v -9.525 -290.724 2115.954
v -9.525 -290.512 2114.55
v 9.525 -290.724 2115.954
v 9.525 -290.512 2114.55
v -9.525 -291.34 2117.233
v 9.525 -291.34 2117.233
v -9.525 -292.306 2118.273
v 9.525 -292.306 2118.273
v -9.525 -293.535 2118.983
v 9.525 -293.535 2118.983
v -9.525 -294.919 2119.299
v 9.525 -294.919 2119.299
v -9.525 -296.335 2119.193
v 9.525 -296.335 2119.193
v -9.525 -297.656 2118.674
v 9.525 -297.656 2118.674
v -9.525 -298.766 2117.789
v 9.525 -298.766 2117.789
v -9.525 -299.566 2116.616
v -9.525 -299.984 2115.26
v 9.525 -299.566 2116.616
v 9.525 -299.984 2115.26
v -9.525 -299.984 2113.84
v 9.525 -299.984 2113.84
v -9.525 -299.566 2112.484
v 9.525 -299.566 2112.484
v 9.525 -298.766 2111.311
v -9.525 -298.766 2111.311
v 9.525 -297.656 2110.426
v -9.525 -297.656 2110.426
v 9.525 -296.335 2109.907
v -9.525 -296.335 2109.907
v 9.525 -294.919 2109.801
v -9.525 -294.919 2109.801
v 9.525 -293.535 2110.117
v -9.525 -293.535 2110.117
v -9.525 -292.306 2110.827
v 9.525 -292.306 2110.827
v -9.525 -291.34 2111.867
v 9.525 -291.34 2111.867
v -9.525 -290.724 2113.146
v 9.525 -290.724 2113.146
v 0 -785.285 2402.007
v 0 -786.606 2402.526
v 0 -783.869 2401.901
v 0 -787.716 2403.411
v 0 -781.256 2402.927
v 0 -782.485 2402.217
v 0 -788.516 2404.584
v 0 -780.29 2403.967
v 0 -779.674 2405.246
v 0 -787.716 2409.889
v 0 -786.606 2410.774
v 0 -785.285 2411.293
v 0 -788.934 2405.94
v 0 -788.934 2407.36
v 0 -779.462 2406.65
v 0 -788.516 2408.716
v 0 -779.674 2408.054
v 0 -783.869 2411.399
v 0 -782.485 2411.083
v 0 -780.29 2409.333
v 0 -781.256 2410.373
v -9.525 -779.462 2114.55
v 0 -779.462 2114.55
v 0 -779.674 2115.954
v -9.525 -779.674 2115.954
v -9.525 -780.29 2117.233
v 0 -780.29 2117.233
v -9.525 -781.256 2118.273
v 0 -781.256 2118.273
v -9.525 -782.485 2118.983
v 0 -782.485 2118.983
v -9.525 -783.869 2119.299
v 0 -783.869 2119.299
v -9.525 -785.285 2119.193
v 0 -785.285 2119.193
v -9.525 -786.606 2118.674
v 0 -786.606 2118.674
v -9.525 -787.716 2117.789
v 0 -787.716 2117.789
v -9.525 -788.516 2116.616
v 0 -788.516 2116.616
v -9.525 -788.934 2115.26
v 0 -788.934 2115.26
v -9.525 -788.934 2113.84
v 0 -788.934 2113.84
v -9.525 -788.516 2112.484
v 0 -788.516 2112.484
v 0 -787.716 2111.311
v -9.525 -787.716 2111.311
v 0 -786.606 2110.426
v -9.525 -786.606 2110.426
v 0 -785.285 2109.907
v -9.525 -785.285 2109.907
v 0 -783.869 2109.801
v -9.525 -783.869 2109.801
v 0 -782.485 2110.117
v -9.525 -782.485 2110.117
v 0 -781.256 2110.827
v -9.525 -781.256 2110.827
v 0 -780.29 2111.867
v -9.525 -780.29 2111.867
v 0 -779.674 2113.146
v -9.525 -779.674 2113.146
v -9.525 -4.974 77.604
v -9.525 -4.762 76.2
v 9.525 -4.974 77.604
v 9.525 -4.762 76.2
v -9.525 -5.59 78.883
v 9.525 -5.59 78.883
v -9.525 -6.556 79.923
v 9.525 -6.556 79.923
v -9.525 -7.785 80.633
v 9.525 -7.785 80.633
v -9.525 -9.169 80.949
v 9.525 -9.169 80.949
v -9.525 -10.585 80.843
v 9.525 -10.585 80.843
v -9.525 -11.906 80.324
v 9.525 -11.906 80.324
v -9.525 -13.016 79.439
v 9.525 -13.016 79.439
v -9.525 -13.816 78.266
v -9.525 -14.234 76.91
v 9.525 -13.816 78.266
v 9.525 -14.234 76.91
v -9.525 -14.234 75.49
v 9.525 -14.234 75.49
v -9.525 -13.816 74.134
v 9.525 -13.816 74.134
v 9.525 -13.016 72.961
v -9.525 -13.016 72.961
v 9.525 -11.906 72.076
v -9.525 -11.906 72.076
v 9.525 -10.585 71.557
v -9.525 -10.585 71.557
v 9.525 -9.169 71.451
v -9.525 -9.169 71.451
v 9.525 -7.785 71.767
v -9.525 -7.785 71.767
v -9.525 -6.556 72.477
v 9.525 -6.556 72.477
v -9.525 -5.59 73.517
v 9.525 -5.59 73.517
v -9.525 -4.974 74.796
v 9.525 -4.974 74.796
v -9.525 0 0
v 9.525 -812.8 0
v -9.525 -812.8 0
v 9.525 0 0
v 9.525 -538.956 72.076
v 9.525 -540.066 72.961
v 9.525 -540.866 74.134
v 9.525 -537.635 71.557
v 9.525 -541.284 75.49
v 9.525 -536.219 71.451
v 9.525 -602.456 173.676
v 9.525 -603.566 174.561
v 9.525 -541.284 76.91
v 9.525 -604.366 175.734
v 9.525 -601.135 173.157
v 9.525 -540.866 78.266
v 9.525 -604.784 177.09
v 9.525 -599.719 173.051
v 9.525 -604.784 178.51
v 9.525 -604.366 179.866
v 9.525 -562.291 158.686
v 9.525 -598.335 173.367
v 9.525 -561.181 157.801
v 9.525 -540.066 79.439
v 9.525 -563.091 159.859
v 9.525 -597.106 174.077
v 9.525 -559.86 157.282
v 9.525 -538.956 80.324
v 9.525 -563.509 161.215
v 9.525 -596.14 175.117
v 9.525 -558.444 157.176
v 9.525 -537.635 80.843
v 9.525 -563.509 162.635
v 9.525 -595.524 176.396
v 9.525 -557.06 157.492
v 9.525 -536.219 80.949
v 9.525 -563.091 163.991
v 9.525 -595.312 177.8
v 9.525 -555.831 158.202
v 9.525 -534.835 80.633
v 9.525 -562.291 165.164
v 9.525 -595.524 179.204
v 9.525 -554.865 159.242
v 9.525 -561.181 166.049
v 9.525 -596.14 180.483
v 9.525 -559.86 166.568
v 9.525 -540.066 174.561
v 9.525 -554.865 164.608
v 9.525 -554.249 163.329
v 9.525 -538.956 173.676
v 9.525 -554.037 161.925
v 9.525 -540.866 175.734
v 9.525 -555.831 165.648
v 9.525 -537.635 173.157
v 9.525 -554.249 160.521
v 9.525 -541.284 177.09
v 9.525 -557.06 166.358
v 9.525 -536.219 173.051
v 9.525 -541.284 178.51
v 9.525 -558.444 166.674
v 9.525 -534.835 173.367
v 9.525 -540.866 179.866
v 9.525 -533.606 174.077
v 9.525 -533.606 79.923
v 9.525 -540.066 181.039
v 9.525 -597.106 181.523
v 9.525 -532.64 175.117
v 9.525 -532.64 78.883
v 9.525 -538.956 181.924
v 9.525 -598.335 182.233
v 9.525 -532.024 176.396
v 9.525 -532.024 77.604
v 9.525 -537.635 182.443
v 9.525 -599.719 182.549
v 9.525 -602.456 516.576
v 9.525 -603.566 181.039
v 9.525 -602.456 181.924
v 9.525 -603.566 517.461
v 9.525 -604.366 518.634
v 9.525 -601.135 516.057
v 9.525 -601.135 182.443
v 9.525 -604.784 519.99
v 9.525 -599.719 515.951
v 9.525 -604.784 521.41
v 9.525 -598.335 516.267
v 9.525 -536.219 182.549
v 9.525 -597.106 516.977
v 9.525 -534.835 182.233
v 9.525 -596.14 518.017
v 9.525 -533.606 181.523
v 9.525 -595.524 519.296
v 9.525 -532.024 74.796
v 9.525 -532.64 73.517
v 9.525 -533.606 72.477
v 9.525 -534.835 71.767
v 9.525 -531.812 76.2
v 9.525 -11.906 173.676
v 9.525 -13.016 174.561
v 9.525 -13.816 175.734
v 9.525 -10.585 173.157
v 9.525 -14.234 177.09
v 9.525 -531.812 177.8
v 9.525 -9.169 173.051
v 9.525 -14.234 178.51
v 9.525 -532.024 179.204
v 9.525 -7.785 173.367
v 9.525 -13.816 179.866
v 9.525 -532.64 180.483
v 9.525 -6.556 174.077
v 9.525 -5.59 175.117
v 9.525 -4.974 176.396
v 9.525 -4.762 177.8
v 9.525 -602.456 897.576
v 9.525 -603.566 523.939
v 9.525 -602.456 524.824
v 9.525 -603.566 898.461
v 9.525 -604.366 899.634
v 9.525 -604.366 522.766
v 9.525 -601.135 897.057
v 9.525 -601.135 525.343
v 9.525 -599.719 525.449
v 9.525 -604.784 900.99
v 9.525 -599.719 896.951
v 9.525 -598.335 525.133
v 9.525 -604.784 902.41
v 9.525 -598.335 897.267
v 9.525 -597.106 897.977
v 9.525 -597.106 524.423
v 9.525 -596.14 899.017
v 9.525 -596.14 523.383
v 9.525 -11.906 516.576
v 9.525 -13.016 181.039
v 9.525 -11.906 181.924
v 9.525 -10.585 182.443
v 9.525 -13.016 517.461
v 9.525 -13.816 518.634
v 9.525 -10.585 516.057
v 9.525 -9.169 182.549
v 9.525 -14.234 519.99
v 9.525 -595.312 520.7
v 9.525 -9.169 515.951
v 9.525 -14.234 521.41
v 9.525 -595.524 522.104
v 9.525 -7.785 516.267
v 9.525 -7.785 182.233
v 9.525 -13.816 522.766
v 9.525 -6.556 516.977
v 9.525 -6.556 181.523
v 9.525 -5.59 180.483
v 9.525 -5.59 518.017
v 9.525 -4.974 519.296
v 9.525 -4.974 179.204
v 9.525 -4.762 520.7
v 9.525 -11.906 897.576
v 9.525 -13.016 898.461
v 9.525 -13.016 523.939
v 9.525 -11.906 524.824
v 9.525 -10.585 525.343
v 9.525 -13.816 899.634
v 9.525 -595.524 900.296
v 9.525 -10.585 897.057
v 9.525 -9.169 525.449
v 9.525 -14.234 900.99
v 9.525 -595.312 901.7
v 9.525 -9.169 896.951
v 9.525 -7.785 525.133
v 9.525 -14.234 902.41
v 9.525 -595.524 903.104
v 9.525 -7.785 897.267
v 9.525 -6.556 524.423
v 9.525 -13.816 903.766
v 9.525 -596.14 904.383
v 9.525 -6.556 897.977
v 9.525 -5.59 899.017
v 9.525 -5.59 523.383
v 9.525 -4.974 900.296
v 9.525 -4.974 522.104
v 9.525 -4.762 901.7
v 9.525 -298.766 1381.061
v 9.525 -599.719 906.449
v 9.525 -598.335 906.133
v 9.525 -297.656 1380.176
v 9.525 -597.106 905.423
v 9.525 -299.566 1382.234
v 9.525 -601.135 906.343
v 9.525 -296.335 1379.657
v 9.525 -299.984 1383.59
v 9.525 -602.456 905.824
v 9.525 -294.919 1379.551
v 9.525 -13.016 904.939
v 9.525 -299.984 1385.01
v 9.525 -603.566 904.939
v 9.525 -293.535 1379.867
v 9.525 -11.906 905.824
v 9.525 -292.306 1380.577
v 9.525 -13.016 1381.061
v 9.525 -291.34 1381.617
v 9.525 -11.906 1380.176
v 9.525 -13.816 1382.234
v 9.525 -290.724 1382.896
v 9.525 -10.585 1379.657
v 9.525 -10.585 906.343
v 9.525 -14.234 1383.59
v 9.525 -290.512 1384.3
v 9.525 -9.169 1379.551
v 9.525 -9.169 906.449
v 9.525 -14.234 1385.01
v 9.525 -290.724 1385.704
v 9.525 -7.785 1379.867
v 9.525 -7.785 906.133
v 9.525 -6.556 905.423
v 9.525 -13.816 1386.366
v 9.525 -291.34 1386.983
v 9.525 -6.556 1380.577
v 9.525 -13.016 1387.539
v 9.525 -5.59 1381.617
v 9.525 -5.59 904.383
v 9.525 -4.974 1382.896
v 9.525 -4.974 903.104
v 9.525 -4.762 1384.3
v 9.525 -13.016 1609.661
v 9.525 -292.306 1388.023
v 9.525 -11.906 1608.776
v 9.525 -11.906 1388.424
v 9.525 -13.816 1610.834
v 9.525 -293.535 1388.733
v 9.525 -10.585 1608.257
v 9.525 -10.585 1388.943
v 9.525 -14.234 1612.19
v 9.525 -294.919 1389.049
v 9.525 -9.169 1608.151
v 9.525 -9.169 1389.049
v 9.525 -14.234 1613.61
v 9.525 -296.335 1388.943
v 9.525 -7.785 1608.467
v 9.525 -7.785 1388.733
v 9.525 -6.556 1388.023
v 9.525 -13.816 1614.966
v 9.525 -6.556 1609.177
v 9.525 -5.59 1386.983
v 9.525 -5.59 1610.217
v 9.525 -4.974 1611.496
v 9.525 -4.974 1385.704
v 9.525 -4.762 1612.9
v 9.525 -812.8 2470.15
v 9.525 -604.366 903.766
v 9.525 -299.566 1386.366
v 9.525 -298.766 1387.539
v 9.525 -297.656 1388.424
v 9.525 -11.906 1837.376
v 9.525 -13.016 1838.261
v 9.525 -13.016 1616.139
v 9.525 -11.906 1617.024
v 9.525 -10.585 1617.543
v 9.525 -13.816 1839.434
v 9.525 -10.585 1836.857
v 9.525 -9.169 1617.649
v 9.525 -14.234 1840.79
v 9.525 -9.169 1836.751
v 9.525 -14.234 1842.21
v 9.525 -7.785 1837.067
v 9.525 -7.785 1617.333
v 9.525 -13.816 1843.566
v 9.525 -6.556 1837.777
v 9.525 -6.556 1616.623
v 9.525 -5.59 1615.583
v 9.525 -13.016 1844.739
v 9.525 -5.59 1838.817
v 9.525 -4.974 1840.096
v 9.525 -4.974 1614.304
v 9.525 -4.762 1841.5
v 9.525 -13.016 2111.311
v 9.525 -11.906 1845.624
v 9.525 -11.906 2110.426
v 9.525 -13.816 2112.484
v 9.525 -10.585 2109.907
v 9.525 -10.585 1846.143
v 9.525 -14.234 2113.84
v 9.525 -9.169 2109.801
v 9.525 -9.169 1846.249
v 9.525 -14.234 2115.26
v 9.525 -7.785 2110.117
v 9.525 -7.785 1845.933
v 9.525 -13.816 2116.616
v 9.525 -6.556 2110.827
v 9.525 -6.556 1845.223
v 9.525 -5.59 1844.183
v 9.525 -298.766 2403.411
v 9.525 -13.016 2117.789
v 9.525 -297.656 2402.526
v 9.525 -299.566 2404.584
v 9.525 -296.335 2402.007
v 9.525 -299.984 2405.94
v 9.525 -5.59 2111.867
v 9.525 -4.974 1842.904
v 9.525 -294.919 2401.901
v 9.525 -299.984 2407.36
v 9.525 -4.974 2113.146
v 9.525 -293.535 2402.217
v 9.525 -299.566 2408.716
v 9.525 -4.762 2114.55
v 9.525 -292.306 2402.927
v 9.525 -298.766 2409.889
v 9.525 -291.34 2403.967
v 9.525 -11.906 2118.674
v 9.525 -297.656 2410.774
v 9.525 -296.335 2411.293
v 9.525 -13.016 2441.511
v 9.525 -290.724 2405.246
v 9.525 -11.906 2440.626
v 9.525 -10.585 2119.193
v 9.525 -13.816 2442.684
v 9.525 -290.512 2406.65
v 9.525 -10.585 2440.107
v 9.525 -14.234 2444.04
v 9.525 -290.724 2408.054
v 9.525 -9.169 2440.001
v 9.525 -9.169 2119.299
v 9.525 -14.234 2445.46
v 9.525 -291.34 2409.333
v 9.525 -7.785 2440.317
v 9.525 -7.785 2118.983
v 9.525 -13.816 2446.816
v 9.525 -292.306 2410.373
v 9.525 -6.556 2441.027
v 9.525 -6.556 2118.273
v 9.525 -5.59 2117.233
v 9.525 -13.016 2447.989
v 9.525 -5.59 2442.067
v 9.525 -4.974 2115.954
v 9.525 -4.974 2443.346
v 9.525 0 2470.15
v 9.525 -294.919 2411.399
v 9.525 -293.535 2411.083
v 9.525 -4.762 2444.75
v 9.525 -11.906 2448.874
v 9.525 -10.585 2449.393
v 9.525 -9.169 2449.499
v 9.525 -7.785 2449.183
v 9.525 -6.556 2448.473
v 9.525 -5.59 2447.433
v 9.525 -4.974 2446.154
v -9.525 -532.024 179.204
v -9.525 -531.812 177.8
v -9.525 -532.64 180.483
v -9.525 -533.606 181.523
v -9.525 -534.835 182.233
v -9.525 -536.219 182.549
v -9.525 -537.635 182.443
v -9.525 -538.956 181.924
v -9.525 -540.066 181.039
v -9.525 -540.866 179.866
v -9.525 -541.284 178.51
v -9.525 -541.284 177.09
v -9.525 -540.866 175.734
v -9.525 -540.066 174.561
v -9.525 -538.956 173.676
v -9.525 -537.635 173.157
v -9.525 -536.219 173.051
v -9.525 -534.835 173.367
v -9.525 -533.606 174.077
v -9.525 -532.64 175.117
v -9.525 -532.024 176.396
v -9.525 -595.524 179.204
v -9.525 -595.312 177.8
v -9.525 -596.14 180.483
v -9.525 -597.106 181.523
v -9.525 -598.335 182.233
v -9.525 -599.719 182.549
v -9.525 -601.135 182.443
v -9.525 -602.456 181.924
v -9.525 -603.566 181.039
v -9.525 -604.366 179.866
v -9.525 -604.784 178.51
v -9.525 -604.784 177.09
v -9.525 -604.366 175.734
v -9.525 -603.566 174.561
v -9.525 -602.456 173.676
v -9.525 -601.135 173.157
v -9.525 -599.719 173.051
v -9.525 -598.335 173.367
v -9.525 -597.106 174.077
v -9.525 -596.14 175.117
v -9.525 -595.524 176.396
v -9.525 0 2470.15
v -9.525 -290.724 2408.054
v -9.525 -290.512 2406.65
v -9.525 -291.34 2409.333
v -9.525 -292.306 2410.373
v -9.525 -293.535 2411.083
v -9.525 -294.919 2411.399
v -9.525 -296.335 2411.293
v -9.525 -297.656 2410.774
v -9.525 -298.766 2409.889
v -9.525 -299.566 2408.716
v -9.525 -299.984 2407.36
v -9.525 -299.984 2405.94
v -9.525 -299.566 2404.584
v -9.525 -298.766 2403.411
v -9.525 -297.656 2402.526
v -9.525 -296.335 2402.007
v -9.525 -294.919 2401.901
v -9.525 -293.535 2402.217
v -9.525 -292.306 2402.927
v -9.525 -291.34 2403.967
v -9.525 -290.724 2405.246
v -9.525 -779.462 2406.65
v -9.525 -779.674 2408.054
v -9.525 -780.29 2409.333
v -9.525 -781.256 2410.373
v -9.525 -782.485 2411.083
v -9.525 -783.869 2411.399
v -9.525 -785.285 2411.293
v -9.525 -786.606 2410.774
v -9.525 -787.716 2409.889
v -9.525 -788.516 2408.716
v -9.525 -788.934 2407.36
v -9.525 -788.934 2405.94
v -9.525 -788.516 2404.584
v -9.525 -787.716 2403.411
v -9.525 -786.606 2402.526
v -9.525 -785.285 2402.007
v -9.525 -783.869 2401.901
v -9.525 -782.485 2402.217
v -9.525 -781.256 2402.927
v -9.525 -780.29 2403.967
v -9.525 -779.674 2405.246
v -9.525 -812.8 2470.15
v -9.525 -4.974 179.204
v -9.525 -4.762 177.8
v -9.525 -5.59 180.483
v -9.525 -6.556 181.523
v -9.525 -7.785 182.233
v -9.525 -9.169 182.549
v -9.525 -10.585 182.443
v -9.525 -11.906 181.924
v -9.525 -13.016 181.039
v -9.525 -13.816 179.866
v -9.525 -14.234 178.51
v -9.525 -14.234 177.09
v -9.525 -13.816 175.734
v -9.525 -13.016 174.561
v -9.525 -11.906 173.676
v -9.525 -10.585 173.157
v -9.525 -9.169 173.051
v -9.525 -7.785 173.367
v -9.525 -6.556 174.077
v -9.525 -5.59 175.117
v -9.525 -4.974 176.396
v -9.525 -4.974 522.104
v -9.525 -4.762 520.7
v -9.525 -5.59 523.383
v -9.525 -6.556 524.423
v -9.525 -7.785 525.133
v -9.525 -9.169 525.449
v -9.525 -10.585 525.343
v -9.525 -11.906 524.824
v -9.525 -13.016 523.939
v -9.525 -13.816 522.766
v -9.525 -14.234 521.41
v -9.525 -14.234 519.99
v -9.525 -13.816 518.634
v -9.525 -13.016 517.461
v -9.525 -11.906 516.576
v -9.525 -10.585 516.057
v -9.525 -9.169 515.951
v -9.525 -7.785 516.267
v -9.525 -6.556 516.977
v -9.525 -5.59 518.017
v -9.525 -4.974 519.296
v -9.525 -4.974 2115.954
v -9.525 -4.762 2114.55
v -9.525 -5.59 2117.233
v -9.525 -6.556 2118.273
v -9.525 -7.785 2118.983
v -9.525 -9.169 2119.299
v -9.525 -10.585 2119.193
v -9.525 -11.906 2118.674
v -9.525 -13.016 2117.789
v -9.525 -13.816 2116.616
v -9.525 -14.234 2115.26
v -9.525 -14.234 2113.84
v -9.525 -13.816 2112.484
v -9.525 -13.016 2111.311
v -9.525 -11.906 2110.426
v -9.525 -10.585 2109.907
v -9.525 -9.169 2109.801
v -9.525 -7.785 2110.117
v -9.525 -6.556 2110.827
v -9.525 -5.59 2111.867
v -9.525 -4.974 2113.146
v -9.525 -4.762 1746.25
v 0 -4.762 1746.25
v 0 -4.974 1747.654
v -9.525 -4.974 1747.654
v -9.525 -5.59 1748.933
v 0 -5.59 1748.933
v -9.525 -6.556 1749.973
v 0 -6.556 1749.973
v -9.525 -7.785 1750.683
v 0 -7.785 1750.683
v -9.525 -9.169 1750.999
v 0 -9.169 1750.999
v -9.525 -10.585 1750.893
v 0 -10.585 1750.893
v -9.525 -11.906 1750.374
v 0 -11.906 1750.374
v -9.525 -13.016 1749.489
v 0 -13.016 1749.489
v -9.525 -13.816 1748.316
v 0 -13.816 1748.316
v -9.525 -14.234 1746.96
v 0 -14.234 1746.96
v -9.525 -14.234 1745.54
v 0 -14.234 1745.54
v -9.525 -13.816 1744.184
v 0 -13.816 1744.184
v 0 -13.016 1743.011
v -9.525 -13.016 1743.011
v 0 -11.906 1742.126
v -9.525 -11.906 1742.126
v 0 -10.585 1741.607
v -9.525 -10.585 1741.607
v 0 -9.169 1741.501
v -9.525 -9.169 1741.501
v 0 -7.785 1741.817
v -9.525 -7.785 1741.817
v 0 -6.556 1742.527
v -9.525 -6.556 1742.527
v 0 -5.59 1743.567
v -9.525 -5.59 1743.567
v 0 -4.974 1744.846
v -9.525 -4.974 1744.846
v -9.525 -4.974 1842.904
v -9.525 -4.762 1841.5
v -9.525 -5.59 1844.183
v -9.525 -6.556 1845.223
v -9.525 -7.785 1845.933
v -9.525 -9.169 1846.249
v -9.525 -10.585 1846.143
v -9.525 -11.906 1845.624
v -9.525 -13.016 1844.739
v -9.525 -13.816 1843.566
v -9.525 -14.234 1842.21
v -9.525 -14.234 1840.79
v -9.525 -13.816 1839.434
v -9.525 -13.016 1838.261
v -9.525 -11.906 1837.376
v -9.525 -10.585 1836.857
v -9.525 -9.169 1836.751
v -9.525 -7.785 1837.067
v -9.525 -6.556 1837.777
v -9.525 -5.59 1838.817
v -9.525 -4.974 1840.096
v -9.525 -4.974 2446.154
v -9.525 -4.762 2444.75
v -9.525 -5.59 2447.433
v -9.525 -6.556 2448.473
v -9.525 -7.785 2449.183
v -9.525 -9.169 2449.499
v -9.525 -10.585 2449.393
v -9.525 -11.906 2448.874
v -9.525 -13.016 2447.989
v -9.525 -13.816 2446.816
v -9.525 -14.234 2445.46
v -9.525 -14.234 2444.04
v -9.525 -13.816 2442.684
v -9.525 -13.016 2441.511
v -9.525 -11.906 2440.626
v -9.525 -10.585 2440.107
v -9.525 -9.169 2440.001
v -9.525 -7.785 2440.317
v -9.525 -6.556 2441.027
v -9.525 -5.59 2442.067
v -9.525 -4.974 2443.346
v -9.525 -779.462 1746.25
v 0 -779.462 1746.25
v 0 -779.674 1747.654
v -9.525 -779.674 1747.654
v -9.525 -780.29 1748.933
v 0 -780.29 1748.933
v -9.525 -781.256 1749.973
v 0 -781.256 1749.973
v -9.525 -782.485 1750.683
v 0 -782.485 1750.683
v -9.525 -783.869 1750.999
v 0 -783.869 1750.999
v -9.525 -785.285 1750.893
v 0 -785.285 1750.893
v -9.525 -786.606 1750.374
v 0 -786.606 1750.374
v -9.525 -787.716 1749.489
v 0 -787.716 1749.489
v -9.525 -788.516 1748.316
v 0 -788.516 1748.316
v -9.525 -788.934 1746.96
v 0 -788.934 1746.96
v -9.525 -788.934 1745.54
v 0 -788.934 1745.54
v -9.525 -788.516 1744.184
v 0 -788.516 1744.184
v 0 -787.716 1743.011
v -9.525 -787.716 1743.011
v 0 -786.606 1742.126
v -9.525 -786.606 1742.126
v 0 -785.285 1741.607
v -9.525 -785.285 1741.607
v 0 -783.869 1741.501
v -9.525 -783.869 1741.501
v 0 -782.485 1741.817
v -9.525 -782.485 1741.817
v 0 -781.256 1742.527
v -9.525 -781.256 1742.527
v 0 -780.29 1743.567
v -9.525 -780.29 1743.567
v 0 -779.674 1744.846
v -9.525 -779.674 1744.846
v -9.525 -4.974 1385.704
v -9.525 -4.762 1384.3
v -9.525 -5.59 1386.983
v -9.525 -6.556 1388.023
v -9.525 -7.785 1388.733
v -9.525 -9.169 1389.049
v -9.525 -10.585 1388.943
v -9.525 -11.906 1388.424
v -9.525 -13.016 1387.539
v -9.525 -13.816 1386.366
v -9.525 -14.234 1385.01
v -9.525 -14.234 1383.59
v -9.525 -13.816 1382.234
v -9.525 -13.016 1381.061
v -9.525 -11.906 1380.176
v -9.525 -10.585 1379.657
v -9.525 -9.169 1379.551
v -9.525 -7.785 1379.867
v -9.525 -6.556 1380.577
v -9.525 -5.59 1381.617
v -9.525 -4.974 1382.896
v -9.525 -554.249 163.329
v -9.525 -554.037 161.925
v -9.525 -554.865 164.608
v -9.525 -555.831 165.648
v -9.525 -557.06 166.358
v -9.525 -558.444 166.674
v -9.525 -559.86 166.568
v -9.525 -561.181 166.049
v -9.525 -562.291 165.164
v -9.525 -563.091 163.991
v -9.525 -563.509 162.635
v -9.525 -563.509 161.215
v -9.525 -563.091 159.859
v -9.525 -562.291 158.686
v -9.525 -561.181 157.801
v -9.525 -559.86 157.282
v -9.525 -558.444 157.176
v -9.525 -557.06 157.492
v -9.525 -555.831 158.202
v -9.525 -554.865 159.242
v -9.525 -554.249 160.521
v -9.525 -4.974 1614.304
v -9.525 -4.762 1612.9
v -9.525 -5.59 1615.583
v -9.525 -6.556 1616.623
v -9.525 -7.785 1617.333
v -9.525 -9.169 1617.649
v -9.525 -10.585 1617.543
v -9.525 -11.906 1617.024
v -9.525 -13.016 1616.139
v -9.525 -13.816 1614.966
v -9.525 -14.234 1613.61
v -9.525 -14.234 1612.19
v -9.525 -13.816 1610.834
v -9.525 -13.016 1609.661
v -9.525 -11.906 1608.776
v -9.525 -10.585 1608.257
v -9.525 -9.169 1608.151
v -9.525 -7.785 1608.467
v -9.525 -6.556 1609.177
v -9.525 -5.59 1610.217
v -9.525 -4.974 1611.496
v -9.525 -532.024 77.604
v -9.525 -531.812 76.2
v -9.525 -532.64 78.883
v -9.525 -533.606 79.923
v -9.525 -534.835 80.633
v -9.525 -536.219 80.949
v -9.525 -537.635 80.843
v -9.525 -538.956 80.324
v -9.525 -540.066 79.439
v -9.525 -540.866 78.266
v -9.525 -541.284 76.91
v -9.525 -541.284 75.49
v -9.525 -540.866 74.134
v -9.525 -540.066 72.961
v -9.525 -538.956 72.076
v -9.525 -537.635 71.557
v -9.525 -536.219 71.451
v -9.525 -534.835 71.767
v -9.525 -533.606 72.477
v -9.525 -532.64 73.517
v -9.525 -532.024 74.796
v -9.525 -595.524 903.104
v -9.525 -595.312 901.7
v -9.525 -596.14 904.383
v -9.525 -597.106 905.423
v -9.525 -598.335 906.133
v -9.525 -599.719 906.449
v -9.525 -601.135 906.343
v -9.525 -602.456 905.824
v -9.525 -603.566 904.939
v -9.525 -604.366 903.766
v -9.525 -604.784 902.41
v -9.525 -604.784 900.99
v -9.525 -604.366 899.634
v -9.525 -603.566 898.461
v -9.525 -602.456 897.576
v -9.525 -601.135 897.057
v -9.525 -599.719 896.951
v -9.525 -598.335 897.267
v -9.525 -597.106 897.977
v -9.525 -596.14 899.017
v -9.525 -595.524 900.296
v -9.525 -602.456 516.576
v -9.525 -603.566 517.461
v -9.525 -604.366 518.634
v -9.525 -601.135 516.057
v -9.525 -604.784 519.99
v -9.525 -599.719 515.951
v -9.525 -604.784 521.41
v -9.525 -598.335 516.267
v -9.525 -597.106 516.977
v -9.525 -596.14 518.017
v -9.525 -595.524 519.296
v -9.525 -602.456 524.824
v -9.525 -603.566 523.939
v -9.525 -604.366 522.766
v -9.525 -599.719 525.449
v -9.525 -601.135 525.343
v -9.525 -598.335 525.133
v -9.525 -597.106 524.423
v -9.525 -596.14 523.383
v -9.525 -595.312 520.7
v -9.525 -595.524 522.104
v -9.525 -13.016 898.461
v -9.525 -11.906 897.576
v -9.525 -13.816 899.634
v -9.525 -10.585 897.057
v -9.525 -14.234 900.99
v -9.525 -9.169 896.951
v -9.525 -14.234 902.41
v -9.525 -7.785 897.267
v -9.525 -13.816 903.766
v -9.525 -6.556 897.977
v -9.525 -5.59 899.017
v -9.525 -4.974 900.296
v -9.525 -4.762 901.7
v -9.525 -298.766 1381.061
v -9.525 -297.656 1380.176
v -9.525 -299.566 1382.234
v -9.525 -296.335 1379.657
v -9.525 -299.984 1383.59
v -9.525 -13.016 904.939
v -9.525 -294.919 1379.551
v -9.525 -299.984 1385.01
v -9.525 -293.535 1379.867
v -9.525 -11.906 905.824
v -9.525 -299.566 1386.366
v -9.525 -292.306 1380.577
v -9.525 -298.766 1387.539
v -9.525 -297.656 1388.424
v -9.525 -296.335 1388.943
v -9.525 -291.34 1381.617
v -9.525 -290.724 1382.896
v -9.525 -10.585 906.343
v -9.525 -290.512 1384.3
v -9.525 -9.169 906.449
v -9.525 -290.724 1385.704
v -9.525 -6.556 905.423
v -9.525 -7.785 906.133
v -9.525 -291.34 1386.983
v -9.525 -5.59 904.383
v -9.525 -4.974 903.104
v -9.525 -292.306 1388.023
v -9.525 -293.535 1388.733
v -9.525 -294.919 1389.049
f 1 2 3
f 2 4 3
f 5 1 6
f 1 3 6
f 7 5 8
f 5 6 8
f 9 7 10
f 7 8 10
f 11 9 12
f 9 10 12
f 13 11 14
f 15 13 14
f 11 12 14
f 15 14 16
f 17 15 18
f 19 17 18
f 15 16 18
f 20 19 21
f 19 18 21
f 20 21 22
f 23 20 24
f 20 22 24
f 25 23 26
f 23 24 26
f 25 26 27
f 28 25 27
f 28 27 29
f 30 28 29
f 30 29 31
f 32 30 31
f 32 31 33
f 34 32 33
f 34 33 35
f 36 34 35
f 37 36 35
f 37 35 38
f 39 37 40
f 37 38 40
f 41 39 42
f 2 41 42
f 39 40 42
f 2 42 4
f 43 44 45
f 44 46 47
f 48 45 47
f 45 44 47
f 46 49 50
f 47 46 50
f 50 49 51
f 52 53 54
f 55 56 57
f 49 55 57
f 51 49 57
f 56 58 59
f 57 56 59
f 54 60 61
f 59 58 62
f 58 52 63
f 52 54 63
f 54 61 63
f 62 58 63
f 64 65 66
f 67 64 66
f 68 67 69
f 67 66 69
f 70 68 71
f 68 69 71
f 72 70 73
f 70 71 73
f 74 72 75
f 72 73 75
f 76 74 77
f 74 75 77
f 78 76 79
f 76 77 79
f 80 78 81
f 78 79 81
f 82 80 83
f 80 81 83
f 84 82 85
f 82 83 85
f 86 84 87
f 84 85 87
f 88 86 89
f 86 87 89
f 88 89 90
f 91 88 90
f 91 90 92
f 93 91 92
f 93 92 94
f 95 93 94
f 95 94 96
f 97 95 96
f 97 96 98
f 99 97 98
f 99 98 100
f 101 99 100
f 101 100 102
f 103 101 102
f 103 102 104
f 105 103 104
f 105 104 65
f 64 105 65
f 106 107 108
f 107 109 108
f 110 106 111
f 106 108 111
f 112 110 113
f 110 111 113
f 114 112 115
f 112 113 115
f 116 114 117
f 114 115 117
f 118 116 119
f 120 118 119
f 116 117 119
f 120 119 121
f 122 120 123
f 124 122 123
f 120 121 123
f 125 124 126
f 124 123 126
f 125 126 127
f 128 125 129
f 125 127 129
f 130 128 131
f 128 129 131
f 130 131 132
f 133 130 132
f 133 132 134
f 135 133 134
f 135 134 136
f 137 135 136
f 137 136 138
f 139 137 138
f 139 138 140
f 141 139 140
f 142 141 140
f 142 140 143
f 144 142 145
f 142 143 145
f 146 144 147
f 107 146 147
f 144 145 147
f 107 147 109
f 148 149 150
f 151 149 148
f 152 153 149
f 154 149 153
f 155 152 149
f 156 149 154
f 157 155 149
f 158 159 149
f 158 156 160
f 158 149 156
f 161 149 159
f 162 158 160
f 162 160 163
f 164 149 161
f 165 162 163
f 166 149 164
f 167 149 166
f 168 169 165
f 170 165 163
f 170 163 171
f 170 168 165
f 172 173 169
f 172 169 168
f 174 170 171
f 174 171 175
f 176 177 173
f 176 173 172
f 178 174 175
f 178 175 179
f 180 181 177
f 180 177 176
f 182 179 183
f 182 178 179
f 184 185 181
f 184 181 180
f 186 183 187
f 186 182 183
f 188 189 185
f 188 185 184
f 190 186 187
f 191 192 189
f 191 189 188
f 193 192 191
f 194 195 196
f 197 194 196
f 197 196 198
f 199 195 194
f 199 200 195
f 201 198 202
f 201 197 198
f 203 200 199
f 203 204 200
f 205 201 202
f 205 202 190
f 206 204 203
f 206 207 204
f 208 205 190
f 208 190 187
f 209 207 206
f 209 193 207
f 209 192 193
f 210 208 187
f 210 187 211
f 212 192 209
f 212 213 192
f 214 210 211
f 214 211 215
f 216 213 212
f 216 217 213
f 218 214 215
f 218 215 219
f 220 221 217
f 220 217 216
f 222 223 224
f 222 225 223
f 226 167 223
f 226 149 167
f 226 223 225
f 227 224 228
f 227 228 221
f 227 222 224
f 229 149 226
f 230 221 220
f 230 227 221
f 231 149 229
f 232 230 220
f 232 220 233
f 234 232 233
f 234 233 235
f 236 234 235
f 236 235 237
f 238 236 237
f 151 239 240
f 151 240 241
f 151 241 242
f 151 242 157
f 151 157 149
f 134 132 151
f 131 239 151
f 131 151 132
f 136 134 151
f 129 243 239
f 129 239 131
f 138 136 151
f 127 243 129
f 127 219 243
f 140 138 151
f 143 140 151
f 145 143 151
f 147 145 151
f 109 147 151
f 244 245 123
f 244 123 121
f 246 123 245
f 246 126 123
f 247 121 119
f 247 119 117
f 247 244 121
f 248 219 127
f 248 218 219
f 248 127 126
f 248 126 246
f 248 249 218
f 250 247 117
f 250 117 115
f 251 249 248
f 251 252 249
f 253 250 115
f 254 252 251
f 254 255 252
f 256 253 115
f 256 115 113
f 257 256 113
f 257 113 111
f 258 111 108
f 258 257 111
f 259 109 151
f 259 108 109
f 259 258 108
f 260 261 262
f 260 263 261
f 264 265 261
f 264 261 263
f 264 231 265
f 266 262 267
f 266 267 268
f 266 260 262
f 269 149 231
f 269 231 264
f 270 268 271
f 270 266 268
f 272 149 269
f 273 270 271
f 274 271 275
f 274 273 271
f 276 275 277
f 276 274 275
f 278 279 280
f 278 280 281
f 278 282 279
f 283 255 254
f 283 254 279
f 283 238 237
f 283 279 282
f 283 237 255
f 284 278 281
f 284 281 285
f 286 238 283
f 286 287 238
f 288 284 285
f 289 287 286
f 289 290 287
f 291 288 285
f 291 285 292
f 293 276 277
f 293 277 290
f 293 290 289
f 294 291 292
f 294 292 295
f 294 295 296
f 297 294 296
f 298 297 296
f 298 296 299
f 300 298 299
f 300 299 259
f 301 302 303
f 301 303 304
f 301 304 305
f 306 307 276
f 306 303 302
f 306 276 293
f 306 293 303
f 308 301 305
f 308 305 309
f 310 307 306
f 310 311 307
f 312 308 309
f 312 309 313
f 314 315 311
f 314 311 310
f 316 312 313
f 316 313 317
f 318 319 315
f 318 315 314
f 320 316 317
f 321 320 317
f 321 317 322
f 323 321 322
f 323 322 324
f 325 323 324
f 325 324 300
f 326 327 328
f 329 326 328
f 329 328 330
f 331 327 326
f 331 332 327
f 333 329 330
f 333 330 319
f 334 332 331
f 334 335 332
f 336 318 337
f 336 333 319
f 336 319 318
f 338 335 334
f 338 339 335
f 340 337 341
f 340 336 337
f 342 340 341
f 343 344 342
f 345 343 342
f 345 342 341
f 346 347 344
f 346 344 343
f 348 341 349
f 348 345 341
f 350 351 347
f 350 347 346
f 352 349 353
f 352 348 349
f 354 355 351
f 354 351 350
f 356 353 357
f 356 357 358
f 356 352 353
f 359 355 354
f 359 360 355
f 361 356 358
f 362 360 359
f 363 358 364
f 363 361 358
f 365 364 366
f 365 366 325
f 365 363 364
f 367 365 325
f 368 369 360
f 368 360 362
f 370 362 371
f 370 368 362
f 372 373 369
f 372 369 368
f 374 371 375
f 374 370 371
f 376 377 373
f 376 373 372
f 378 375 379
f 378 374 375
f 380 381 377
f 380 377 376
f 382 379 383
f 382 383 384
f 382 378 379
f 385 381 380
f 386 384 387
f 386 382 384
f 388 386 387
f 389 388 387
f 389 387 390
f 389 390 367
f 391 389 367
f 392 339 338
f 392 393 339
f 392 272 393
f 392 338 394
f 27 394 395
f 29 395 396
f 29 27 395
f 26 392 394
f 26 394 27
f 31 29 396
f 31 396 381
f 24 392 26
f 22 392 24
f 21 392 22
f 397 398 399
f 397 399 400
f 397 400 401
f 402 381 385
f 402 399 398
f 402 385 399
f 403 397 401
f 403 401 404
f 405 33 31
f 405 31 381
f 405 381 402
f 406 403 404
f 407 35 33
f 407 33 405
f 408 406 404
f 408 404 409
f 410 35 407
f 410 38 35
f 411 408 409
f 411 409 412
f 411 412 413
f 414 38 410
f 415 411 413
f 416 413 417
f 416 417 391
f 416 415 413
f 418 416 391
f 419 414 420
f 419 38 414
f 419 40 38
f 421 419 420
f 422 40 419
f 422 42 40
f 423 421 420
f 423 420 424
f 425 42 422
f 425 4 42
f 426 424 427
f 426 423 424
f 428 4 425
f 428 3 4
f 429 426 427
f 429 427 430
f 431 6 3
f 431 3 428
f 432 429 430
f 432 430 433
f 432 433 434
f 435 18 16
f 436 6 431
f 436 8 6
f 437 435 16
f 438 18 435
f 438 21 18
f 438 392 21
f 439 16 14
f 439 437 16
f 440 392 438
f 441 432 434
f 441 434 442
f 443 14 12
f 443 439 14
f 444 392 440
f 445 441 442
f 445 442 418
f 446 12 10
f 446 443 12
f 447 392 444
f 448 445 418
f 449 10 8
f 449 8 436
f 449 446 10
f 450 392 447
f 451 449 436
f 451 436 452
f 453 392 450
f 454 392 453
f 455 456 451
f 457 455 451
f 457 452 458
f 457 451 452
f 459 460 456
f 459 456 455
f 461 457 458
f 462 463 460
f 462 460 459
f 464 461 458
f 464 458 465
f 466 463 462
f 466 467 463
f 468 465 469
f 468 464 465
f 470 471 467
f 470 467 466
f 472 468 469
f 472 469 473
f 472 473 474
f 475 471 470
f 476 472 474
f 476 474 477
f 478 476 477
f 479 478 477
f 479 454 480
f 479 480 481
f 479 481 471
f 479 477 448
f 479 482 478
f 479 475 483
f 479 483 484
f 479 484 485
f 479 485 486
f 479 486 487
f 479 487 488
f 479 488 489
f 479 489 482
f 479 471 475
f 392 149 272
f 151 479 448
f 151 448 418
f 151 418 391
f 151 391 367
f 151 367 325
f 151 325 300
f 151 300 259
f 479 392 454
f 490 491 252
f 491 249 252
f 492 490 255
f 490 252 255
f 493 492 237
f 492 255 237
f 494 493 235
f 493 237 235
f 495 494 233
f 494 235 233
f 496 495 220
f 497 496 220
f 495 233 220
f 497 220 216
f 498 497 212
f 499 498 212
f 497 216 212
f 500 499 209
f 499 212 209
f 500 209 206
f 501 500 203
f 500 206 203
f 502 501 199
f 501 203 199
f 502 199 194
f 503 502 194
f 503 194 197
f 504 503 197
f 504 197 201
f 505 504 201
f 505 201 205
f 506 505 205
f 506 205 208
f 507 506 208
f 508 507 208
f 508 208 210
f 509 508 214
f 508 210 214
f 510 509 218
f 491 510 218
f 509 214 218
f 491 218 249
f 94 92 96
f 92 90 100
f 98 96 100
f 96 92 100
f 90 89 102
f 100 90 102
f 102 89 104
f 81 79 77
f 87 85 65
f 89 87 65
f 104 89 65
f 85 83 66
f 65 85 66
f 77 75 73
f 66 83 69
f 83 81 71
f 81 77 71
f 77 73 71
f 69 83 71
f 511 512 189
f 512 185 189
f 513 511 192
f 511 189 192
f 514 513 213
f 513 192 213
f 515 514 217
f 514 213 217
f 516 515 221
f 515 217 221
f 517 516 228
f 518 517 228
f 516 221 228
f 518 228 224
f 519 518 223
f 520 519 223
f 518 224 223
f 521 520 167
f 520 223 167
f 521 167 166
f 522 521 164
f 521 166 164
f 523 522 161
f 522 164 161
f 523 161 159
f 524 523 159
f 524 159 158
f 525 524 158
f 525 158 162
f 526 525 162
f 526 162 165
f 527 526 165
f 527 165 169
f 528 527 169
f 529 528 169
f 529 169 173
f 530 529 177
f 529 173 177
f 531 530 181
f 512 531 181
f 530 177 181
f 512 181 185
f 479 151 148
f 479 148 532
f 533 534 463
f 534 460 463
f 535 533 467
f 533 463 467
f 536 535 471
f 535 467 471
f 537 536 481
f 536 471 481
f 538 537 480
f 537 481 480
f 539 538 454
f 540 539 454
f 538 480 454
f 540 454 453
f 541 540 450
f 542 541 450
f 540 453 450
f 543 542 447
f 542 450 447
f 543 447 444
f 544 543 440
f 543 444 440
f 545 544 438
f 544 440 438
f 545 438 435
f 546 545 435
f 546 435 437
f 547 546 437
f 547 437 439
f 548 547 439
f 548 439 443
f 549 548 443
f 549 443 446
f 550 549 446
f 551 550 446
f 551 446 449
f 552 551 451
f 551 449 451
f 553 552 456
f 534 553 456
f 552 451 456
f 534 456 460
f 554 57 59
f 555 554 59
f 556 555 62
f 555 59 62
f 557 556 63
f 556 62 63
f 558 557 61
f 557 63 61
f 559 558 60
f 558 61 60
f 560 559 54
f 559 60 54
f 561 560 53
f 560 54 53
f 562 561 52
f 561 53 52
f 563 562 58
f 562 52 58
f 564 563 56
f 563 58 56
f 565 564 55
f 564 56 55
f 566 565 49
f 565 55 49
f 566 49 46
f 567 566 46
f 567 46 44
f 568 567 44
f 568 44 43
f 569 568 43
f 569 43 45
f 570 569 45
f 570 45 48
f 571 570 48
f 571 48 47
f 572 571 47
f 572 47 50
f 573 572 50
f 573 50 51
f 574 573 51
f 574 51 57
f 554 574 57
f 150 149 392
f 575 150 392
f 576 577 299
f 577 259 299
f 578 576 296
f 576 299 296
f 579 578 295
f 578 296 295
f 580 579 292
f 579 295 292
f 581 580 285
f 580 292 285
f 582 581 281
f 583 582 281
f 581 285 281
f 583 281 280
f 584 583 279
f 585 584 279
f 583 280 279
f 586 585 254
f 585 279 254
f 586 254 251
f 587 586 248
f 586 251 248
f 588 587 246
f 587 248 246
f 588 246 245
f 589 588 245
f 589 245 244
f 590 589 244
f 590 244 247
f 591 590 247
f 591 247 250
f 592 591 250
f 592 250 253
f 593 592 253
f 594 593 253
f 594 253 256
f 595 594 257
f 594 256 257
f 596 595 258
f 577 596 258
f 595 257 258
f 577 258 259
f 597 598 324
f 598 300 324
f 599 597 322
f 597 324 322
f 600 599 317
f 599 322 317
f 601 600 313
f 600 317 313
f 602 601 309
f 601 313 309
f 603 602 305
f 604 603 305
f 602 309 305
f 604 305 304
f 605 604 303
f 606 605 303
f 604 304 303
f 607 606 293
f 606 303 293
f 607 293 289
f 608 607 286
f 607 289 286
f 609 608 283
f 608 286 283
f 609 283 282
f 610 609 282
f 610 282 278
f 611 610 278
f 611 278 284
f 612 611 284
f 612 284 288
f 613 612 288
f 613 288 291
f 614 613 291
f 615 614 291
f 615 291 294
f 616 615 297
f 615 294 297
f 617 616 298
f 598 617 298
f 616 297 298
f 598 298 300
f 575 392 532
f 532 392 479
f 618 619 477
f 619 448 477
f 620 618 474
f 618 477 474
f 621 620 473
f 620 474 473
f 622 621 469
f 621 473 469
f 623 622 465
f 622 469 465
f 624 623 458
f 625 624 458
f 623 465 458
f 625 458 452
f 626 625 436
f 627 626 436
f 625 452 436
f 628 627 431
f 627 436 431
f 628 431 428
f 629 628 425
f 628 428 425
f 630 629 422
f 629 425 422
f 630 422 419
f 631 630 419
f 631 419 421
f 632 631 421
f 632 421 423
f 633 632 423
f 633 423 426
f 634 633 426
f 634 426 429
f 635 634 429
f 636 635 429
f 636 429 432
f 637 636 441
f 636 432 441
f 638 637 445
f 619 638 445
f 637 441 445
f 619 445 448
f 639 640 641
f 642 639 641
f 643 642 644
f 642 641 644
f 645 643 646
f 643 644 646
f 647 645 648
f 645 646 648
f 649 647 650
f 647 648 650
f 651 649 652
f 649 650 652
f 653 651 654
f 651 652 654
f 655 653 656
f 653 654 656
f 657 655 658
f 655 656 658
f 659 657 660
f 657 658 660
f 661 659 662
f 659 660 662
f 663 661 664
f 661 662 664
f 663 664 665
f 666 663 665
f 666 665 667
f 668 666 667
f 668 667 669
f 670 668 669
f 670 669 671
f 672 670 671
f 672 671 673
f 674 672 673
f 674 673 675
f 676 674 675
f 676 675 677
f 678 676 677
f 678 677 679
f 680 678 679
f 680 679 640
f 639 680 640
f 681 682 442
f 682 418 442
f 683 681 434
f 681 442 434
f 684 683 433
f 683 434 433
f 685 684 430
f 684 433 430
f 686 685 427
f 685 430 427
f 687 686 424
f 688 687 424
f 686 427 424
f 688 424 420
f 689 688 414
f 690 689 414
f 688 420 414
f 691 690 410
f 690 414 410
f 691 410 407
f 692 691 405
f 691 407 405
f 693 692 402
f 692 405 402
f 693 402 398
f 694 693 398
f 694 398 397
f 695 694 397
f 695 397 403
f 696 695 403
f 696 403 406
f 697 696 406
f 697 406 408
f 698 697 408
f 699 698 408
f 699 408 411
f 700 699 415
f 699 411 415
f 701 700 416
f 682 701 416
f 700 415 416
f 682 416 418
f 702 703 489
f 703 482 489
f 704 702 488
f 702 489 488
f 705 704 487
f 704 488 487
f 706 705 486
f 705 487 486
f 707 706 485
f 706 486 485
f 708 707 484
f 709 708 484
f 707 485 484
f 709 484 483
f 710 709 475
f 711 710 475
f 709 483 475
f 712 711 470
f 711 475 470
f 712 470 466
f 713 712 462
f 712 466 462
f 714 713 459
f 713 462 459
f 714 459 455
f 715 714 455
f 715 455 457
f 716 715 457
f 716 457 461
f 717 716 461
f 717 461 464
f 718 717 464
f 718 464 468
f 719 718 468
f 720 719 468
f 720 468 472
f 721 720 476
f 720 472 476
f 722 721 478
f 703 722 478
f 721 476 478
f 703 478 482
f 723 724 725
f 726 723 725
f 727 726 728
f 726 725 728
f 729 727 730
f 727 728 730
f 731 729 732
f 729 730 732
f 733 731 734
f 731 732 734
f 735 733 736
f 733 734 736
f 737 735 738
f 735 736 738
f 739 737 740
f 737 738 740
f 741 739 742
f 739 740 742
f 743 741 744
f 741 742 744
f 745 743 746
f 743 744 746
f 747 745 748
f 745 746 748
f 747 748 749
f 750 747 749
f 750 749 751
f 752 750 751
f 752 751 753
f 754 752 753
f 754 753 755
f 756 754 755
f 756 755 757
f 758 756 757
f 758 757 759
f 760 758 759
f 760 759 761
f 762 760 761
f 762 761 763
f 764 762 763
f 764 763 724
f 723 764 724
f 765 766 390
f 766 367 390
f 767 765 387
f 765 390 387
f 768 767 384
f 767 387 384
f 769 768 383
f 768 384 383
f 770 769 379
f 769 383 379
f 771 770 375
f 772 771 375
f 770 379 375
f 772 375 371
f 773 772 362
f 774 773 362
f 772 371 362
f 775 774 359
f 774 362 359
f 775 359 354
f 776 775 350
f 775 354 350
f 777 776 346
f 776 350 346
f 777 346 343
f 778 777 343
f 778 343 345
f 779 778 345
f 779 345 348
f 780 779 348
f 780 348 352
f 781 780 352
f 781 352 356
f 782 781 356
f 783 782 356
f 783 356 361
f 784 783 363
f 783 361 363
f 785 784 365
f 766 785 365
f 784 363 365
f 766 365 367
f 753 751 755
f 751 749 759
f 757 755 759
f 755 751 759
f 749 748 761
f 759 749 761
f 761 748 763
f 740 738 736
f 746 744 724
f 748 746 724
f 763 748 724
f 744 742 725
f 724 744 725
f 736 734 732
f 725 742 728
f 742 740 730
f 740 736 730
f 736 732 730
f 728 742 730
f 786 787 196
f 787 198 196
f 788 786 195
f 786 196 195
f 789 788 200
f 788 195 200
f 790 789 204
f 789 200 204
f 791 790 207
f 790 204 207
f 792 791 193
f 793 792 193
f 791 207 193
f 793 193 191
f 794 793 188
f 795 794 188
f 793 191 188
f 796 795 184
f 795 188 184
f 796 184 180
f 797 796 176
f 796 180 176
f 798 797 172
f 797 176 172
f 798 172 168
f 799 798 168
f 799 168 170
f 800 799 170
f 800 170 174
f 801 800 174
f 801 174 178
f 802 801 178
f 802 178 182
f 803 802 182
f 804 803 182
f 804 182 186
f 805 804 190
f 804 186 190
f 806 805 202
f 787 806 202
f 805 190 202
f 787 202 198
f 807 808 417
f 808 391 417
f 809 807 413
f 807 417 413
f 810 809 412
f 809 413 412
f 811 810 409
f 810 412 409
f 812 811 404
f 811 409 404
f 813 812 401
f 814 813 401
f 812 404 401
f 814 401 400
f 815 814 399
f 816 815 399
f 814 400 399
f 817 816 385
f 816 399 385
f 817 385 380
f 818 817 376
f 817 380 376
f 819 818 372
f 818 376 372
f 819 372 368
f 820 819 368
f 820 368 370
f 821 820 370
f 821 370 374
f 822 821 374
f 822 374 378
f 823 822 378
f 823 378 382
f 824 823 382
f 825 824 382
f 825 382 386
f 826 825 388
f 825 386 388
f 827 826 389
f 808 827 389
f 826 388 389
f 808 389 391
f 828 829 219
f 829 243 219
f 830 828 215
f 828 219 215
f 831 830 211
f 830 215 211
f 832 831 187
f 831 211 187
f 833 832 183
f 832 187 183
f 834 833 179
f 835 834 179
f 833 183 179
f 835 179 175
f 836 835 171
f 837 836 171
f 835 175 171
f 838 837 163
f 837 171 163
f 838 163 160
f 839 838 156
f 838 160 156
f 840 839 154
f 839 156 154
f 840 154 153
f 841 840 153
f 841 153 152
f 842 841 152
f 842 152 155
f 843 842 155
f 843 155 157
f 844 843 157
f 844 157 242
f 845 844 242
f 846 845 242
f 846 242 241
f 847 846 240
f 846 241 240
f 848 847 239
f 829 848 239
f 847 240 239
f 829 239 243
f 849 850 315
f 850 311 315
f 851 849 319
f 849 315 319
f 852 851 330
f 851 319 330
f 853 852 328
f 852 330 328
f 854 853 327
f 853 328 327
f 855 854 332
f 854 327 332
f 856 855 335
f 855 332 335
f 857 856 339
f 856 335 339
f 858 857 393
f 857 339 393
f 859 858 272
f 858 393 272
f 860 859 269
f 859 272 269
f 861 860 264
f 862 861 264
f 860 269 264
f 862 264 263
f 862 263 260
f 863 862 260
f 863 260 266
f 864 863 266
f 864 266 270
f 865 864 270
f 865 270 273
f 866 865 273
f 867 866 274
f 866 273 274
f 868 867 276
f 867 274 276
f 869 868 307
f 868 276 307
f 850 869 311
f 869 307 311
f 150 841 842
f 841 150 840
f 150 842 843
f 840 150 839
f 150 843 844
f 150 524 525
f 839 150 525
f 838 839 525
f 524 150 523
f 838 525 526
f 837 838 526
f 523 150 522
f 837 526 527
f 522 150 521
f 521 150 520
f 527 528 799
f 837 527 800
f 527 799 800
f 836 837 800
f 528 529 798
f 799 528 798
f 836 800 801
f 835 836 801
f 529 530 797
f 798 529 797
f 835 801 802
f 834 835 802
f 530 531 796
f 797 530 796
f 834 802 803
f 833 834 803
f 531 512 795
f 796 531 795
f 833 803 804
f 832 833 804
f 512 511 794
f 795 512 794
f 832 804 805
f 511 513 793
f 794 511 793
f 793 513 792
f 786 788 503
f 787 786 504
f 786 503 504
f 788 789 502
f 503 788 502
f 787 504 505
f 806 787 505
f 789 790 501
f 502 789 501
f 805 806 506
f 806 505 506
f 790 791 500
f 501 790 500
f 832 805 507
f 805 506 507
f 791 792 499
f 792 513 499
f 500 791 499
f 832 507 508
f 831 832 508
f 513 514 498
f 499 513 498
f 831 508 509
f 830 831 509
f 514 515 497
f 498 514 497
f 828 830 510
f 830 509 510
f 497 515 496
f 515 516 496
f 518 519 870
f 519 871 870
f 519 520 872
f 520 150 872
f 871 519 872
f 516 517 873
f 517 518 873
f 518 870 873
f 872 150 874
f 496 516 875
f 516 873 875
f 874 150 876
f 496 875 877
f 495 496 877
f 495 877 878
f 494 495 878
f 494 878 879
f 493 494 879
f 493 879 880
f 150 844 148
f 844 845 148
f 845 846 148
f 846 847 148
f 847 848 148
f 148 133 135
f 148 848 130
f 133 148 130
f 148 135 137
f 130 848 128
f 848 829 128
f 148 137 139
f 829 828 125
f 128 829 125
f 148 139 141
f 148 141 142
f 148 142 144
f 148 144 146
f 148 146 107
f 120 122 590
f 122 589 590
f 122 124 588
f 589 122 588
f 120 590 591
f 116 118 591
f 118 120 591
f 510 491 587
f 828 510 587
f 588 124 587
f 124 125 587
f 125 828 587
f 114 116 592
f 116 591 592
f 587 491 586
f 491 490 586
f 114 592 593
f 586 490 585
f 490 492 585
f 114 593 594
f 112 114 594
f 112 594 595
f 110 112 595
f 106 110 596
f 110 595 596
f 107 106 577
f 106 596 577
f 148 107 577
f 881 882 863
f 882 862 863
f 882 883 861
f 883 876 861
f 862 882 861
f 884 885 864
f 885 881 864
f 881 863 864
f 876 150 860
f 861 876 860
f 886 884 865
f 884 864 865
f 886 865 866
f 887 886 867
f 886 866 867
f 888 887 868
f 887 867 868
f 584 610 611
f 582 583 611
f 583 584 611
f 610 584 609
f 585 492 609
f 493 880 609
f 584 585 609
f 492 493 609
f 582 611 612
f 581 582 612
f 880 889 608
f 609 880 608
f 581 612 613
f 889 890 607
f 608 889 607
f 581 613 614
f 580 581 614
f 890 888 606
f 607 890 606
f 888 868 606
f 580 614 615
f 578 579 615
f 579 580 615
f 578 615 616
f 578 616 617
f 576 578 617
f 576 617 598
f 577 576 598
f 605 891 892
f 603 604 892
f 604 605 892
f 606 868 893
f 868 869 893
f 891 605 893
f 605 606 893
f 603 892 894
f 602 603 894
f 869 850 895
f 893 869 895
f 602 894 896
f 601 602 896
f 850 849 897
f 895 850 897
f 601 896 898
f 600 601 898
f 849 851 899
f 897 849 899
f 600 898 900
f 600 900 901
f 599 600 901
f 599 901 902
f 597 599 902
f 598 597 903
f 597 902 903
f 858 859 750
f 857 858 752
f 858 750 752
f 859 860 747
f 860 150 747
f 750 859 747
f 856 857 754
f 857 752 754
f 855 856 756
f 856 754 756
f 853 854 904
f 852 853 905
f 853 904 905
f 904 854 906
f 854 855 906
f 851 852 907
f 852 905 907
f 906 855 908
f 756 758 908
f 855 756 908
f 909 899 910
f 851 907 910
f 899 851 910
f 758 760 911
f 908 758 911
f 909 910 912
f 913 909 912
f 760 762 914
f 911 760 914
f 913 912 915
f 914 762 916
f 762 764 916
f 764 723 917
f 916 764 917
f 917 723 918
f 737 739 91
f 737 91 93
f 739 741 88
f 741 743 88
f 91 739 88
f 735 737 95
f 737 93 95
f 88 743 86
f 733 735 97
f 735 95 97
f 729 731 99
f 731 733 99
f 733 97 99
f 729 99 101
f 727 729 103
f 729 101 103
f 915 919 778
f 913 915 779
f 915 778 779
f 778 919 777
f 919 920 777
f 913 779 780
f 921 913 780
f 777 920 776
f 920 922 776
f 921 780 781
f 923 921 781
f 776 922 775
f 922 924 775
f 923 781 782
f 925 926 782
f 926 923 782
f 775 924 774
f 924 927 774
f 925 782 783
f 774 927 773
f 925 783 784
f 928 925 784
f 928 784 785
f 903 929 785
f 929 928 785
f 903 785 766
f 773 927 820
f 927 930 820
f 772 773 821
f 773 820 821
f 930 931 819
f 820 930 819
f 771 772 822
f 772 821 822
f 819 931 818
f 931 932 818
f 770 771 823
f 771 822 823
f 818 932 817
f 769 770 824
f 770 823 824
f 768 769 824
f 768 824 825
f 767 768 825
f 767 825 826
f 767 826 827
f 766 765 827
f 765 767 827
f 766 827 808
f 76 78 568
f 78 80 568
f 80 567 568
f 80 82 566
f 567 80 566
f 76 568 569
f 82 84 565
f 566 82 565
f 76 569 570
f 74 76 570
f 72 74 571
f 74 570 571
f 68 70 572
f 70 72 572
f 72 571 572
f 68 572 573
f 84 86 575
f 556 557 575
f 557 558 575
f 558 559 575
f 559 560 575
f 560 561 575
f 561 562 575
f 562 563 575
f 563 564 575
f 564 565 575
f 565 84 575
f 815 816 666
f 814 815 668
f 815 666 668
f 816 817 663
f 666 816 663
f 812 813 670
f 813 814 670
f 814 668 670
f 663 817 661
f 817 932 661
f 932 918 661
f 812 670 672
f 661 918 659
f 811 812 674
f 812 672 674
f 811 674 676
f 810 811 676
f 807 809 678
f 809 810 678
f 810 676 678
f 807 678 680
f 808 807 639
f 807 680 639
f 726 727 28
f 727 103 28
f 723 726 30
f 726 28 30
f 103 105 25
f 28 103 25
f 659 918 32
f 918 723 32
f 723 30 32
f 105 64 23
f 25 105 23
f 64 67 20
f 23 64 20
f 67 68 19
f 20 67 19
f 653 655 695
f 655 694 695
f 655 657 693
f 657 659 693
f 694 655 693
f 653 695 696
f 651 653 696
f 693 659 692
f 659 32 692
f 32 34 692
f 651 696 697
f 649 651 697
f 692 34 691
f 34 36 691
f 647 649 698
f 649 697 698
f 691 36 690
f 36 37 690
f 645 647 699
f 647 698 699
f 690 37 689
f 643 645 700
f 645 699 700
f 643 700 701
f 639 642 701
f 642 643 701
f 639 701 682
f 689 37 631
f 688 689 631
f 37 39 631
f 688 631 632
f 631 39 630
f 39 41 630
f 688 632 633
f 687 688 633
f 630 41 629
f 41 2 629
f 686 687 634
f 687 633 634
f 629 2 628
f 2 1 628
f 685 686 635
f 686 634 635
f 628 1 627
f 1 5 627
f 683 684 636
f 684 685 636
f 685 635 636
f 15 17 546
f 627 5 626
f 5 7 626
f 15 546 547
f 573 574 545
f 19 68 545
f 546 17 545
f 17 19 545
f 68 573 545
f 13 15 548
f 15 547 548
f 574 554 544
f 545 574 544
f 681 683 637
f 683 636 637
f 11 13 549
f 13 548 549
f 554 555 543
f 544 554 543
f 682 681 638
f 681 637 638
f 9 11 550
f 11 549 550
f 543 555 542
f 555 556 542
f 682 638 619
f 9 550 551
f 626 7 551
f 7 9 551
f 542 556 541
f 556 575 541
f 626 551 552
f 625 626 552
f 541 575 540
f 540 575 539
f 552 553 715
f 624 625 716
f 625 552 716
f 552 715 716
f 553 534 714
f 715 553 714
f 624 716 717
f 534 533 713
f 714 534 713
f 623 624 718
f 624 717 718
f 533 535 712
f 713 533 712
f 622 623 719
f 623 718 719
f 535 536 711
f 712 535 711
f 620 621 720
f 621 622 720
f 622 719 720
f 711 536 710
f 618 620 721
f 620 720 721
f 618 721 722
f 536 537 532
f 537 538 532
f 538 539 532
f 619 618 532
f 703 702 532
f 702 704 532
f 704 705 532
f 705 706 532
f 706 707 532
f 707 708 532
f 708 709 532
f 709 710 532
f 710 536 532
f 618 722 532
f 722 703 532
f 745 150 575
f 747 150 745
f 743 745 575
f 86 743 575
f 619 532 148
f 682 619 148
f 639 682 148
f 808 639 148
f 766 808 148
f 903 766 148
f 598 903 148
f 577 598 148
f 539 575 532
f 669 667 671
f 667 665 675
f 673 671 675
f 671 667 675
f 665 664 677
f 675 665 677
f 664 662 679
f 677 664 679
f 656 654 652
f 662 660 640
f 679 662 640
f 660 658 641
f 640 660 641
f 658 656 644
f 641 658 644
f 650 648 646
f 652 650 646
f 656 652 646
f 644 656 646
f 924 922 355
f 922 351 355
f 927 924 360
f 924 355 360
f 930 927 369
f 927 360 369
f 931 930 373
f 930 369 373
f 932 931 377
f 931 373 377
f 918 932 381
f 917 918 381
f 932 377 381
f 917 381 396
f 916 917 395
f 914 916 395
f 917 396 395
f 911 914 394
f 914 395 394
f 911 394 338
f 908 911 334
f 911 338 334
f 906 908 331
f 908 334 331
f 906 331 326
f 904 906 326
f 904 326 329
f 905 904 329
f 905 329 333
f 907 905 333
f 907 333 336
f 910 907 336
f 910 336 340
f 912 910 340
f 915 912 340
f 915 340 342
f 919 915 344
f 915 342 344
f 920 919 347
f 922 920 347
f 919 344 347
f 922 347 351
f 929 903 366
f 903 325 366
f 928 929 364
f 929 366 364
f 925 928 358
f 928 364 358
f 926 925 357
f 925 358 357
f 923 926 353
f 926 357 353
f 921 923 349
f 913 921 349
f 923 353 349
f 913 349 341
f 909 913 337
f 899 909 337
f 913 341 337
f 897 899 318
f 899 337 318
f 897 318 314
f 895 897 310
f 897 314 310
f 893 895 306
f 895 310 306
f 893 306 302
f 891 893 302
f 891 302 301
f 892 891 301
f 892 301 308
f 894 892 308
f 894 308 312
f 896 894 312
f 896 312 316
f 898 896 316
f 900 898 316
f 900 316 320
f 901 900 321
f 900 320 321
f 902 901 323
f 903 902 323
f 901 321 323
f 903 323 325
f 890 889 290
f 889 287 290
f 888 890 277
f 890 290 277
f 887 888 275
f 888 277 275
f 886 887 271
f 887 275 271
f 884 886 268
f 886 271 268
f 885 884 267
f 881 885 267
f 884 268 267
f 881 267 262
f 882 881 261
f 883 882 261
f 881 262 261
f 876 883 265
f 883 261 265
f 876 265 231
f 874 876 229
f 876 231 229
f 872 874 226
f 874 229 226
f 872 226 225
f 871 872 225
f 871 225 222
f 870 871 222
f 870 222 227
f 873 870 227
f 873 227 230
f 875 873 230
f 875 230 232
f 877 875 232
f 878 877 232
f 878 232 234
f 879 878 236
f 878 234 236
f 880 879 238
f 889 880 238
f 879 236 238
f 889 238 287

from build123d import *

# Parameters (mm, degrees)
F0_W     = 812.8
F0_H     = 2470.15
F1_DEPTH = 9.525
F2_R     = 4.7625
F3_DEPTH = 12.7
F4_R     = 4.7625
F5_DEPTH = 25.4


with BuildPart() as f1:
    # F0 (on Right) → F1 (new body, symmetric)
    with BuildSketch(Plane.YZ):
        with Locations((-406.4, 1235.075)):
            Rectangle(F0_W, F0_H)
    extrude(amount=F1_DEPTH, both=True)

    # F2 (on Right) → F3 (cut, symmetric)
    with BuildSketch(Plane.YZ):
        with Locations((-295.275, 1384.3)):
            Circle(F2_R)
        with Locations((-295.275, 2114.55)):
            Circle(F2_R)
        with Locations((-295.275, 2406.65)):
            Circle(F2_R)
        with Locations((-9.525, 2444.75)):
            Circle(F2_R)
        with Locations((-9.525, 2114.55)):
            Circle(F2_R)
        with Locations((-9.525, 1384.3)):
            Circle(F2_R)
        with Locations((-9.525, 1612.9)):
            Circle(F2_R)
        with Locations((-9.525, 1841.5)):
            Circle(F2_R)
        with Locations((-9.525, 76.2)):
            Circle(F2_R)
        with Locations((-9.525, 177.8)):
            Circle(F2_R)
        with Locations((-9.525, 520.7)):
            Circle(F2_R)
        with Locations((-9.525, 901.7)):
            Circle(F2_R)
        with Locations((-536.575, 76.2)):
            Circle(F2_R)
        with Locations((-536.575, 177.8)):
            Circle(F2_R)
        with Locations((-600.075, 177.8)):
            Circle(F2_R)
        with Locations((-558.8, 161.925)):
            Circle(F2_R)
        with Locations((-600.075, 520.7)):
            Circle(F2_R)
        with Locations((-600.075, 901.7)):
            Circle(F2_R)
    extrude(amount=F3_DEPTH, both=True, mode=Mode.SUBTRACT)

    # F4 (on Right) → F5 (cut)
    with BuildSketch(Plane.YZ):
        with Locations((-784.225, 1746.25)):
            Circle(F4_R)
        with Locations((-784.225, 2114.55)):
            Circle(F4_R)
        with Locations((-784.225, 2406.65)):
            Circle(F4_R)
        with Locations((-9.525, 1746.25)):
            Circle(F4_R)
    extrude(amount=-F5_DEPTH, mode=Mode.SUBTRACT)


solid = f1.part
